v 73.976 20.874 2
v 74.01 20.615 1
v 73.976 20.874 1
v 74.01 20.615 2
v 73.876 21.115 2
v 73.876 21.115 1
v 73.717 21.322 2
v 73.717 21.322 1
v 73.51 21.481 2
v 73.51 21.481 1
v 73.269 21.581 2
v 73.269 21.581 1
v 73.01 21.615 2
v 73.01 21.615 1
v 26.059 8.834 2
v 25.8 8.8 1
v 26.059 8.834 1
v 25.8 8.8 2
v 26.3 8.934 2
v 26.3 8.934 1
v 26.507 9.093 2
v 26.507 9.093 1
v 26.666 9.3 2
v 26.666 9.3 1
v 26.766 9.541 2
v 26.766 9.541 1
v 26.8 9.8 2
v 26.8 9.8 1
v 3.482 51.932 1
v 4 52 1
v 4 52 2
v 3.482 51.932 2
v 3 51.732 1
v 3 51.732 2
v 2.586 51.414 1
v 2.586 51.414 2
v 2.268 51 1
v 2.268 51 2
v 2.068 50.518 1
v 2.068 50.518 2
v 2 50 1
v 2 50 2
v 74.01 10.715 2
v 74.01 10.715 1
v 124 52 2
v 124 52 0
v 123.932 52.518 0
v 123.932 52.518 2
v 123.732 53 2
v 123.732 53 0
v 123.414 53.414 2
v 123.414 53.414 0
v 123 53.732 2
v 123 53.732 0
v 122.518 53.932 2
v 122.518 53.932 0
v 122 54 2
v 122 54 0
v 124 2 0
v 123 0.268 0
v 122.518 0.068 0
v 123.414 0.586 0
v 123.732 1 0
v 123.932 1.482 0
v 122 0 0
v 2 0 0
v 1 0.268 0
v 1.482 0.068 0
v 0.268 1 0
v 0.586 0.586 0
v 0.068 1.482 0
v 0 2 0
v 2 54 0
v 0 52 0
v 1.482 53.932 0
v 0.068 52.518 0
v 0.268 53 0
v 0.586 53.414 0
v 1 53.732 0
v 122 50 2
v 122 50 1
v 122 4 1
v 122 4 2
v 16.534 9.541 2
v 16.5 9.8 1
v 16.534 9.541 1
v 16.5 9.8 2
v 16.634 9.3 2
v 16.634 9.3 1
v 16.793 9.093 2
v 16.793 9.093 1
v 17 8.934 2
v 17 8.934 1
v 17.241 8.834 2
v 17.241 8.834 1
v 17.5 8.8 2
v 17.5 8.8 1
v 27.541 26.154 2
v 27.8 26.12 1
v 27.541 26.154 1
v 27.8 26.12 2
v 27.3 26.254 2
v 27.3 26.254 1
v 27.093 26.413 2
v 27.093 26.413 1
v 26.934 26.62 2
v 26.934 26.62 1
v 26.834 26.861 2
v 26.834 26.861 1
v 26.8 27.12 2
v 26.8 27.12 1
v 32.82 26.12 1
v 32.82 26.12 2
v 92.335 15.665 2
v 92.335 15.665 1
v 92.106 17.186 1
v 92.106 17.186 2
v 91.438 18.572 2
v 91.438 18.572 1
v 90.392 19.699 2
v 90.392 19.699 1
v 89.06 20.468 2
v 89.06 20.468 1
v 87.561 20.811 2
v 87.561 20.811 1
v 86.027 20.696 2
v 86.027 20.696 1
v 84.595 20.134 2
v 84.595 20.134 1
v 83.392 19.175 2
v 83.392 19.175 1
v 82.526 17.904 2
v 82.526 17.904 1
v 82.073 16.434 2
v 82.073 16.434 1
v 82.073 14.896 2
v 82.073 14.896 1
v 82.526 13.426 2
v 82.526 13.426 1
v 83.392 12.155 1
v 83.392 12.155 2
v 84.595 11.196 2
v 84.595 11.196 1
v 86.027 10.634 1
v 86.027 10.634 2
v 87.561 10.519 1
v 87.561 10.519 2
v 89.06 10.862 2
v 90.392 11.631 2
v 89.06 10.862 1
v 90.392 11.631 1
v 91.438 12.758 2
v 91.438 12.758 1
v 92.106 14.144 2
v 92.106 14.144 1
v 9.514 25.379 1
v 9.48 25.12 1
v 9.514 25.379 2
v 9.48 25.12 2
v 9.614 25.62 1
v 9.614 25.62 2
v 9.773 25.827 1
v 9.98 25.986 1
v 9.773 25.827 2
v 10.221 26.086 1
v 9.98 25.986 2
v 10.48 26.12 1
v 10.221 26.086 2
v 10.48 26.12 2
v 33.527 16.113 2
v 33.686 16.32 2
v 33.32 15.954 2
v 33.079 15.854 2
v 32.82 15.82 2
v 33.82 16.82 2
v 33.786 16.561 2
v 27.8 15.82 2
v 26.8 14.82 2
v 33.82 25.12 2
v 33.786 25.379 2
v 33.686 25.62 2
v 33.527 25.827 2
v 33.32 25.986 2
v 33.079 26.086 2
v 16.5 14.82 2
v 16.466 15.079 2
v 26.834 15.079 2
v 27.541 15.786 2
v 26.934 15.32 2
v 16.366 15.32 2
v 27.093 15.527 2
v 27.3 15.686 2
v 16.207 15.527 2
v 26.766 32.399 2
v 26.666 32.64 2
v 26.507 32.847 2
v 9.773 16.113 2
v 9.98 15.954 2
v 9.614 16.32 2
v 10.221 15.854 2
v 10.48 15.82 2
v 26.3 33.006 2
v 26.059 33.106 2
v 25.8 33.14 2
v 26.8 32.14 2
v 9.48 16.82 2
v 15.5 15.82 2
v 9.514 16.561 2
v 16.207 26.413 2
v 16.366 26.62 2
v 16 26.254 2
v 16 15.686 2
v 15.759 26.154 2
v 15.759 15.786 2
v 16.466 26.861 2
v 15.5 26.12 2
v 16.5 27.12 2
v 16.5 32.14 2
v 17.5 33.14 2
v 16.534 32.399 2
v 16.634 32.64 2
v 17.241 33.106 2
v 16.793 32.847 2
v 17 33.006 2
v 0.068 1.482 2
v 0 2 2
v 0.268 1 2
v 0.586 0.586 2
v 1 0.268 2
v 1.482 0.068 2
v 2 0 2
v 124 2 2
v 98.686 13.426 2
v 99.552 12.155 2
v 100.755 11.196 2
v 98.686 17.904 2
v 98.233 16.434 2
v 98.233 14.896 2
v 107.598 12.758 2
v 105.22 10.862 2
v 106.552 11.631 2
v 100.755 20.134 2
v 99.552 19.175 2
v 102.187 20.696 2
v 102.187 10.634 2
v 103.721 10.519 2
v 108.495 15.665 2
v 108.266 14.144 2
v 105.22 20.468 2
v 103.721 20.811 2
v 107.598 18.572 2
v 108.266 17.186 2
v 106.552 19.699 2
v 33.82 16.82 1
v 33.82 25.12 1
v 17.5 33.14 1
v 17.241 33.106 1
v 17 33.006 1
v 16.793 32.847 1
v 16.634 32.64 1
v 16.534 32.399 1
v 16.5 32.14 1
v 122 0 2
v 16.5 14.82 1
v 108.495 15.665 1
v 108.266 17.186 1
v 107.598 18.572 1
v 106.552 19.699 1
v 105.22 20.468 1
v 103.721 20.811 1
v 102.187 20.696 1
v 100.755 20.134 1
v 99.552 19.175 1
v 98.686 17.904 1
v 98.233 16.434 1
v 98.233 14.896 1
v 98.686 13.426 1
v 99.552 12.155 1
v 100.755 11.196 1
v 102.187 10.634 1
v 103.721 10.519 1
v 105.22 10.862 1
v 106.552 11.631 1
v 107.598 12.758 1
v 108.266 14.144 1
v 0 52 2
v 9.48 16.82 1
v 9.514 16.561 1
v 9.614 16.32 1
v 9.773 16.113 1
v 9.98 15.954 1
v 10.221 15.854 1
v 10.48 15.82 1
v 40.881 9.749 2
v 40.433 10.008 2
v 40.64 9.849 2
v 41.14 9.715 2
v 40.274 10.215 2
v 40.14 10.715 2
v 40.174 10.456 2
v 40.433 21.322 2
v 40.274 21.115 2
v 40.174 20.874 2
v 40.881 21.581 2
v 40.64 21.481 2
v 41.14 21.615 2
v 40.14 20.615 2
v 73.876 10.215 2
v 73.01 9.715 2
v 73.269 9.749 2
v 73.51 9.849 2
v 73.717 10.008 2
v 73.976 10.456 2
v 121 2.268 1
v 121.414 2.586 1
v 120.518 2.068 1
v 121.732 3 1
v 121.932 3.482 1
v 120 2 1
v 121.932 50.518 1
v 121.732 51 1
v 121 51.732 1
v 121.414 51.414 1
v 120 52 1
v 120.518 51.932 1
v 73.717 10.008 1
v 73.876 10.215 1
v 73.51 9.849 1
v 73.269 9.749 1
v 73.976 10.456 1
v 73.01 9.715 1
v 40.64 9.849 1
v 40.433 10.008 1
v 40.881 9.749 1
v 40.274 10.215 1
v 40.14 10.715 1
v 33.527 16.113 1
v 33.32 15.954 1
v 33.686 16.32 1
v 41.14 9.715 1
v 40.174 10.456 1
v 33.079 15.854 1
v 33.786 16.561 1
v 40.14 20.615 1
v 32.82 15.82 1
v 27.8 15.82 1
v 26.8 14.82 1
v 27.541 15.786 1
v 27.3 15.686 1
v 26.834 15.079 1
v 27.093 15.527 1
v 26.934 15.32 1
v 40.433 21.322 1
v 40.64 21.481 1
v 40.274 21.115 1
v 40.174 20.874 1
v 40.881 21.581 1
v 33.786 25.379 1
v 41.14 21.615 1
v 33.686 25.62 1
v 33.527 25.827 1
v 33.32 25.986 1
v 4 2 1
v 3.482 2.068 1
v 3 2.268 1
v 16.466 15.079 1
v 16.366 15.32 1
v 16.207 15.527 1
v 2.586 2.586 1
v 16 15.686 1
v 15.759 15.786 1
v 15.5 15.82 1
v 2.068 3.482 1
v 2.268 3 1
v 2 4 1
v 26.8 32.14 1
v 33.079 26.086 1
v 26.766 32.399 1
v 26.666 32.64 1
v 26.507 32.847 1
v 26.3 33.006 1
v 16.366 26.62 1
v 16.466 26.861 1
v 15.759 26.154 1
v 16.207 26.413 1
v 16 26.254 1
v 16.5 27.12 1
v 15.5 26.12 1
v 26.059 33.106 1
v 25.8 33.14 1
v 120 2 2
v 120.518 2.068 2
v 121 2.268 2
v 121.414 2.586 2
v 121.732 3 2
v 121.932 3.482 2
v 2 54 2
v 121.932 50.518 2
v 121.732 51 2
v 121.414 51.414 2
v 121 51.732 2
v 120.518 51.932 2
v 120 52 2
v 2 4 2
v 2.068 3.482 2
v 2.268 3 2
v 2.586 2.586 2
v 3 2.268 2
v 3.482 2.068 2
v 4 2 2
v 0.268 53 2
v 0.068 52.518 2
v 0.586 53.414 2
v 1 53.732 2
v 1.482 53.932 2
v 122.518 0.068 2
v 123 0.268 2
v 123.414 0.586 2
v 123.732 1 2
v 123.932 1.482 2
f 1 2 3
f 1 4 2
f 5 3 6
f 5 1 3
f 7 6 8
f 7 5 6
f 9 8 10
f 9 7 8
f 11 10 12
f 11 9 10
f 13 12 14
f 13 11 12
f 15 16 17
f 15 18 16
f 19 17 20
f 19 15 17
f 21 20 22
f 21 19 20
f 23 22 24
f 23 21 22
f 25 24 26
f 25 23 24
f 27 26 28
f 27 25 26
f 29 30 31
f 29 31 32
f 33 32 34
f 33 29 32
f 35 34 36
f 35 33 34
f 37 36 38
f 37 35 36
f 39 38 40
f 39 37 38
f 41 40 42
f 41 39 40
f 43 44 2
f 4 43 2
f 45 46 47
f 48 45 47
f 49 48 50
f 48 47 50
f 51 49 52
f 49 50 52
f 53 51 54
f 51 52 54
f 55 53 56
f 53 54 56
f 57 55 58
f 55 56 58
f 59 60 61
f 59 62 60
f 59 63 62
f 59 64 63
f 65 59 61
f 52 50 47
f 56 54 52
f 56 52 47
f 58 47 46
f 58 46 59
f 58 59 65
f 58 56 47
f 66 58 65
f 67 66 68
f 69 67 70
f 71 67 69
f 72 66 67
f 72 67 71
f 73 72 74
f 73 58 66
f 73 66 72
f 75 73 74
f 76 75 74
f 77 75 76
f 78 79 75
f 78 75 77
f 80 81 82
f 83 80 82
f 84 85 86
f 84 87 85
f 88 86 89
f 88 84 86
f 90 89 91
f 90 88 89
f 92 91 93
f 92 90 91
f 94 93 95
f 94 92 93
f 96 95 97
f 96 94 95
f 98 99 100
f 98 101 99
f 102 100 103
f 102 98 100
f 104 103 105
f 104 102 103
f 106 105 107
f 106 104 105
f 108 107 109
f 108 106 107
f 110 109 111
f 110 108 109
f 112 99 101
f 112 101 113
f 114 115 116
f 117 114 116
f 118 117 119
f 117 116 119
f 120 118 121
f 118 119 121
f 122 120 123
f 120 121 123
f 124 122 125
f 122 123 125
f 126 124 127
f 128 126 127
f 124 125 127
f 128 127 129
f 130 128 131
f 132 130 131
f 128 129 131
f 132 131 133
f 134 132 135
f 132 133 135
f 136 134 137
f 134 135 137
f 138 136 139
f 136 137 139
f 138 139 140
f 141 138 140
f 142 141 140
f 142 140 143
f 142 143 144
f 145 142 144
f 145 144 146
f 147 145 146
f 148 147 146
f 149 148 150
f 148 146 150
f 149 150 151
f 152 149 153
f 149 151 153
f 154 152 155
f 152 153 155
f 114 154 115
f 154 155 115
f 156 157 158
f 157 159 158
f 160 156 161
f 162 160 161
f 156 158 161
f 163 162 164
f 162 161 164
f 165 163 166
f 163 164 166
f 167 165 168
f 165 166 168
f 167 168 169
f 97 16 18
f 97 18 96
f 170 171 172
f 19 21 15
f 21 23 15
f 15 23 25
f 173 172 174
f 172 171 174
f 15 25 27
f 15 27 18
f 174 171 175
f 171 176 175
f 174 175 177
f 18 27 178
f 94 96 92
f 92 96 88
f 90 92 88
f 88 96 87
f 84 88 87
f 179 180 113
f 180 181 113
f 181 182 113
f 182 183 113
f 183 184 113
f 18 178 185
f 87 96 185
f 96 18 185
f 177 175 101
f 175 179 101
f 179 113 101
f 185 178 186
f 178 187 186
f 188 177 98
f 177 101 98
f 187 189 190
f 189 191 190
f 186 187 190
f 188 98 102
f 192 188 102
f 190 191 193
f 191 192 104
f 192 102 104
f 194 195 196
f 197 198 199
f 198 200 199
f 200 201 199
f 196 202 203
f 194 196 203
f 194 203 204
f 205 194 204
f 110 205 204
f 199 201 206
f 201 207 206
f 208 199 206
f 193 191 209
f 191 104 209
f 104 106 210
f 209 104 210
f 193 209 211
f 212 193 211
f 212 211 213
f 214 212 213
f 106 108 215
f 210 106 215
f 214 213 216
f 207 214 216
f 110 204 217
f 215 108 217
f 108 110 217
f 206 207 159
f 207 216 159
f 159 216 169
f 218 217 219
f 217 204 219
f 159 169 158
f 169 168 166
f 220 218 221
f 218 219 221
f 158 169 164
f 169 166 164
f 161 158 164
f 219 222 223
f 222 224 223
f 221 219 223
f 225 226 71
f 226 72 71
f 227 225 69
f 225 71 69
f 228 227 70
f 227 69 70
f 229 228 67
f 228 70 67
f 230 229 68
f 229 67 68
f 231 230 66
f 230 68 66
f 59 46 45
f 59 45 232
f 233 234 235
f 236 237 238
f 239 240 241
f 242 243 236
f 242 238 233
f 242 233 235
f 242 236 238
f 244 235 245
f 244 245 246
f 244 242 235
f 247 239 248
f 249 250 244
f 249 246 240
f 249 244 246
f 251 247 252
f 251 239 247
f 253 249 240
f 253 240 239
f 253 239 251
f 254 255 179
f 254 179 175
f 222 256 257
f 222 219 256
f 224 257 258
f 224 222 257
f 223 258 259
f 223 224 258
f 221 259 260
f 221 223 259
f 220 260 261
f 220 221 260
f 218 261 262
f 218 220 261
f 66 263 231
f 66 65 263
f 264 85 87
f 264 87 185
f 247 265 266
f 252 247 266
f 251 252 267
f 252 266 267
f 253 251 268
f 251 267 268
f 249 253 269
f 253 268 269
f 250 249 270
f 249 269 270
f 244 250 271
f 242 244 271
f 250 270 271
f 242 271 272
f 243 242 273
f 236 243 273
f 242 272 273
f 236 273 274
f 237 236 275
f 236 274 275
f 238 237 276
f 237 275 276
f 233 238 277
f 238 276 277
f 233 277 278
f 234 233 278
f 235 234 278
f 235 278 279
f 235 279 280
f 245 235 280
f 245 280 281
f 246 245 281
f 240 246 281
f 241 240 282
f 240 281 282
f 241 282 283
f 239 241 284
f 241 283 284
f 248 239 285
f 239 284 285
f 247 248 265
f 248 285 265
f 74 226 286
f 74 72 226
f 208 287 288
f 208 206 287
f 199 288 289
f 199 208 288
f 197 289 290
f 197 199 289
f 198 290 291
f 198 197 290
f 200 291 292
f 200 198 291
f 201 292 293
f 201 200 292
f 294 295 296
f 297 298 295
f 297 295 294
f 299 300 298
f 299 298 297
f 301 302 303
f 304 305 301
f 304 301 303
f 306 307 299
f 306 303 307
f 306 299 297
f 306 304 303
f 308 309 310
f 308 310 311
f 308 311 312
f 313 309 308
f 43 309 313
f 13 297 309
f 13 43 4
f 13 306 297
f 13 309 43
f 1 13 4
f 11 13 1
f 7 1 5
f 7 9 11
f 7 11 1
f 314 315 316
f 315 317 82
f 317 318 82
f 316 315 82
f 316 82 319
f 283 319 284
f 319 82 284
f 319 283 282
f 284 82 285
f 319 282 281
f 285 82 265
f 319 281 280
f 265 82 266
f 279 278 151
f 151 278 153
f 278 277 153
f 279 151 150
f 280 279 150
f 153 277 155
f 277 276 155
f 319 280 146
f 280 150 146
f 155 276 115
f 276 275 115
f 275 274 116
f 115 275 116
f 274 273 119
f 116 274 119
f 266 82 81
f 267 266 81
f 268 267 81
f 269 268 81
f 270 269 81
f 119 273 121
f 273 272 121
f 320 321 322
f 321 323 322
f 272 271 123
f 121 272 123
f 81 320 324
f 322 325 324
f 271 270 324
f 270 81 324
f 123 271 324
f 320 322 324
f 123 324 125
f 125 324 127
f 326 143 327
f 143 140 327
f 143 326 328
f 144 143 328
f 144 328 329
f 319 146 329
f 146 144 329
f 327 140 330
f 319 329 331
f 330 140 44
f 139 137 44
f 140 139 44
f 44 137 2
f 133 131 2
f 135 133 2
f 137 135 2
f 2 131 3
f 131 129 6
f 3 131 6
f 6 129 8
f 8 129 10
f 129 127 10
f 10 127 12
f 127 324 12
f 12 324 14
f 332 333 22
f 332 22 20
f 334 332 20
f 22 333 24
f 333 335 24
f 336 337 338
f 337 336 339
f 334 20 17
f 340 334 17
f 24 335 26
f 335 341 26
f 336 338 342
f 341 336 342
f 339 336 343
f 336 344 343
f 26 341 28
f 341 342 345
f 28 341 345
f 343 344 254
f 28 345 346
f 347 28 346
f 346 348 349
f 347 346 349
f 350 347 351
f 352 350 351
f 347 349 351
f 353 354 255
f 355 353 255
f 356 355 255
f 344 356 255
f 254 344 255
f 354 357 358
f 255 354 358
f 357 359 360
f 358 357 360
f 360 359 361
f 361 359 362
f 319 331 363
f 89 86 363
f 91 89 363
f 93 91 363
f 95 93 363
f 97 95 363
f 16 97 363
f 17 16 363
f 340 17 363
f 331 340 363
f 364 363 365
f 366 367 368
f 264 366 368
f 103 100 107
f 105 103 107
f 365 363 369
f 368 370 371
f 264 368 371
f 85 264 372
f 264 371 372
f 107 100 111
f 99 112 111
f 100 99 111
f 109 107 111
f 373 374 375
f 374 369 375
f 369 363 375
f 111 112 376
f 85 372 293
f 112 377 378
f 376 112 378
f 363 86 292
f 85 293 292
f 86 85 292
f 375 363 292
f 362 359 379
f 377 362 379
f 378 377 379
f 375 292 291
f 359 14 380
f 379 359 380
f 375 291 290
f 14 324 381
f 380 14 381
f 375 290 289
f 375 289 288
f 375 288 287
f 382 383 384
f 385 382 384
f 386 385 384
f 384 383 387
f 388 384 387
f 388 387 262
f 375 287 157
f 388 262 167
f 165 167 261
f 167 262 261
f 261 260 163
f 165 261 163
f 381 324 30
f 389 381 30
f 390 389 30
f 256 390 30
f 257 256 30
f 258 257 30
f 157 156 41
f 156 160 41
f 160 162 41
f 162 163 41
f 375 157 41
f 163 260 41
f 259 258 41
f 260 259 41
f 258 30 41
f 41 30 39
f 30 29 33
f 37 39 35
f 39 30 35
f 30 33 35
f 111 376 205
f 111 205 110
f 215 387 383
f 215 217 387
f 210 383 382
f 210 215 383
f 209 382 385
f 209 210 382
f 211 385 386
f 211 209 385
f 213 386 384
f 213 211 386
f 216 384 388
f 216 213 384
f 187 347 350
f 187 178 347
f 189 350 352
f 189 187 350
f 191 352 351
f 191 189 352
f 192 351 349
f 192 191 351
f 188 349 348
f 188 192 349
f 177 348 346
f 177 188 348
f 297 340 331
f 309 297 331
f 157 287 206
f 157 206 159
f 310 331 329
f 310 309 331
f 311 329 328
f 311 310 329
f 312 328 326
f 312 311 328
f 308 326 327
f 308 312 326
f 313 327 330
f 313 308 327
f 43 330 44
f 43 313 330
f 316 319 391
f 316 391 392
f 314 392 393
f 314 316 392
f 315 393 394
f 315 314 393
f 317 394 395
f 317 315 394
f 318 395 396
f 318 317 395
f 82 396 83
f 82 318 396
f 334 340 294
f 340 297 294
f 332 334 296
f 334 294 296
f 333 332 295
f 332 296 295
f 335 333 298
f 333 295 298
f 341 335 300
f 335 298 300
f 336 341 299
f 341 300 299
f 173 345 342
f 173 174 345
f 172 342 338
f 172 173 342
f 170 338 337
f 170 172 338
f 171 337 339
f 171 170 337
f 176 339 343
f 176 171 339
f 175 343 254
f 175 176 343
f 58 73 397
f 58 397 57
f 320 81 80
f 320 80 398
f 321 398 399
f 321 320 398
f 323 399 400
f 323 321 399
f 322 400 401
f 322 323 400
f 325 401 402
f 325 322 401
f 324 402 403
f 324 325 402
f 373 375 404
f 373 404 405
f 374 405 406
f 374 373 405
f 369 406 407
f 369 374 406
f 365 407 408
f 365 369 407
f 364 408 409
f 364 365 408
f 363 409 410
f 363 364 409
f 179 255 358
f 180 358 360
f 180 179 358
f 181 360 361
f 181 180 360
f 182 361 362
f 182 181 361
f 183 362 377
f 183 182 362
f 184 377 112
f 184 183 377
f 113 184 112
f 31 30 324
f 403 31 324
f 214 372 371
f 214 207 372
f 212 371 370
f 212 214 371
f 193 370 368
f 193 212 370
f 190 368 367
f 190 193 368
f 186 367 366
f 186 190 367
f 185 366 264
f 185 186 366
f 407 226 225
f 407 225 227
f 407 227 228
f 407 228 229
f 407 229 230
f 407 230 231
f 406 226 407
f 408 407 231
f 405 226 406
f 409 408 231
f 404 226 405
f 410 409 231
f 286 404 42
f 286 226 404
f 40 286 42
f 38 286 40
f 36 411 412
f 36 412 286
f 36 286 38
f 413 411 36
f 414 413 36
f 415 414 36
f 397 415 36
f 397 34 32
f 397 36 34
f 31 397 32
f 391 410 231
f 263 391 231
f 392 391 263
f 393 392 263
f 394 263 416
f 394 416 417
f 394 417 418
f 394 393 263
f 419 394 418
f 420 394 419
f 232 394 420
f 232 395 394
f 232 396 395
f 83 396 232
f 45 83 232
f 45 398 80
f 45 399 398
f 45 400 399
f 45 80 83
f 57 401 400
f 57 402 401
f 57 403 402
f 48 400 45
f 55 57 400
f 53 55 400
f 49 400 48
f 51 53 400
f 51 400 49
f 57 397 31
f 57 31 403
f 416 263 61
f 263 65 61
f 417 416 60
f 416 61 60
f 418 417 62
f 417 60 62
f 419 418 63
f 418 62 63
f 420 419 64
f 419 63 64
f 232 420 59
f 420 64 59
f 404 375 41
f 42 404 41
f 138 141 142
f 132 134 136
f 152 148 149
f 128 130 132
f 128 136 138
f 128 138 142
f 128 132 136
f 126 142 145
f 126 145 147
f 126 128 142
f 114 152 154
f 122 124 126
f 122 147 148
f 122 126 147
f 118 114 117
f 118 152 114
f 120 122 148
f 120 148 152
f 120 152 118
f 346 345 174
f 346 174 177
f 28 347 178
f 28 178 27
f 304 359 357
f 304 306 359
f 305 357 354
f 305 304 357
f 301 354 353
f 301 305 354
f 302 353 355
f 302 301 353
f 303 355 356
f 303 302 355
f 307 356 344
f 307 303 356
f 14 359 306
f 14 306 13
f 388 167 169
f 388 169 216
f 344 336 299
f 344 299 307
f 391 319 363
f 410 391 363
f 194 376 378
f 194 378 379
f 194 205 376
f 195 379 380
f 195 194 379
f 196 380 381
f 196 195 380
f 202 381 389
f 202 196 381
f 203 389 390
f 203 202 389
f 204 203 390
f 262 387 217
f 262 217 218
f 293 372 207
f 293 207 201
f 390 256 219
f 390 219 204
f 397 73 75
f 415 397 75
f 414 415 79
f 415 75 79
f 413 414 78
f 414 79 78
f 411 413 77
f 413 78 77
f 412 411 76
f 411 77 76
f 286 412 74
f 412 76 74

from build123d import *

# Parameters (mm, degrees)
PAD_DEPTH    = 1
SKETCH001_R  = 5.16
SKETCH001_W  = 33.87
SKETCH001_H  = 11.9
PAD001_DEPTH = 1
FILLET_R     = 1


with BuildPart() as part:
    # Sketch → Pad (new body)
    with BuildSketch(Plane.XY):
        with BuildLine():
            Line((2, 54), (122, 54))
            ThreePointArc((124, 52), (123.414214, 53.414214), (122, 54))
            Line((124, 52), (124, 2))
            ThreePointArc((122, 0), (123.414214, 0.585786), (124, 2))
            Line((122, 0), (2, 0))
            ThreePointArc((0, 2), (0.585786, 0.585786), (2, 0))
            Line((0, 2), (0, 52))
            ThreePointArc((2, 54), (0.585786, 53.414214), (0, 52))
        make_face()
    extrude(amount=PAD_DEPTH)

    # Sketch001 (on Face10 of Pad) → Pad001 (join)
    with BuildSketch(Plane.XY.offset(1)):
        with BuildLine():
            ThreePointArc((2, 54), (0.585786, 53.414214), (0, 52))
            Line((0, 2), (0, 52))
            ThreePointArc((0, 2), (0.585786, 0.585786), (2, 0))
            Line((122, 0), (2, 0))
            ThreePointArc((122, 0), (123.414214, 0.585786), (124, 2))
            Line((124, 52), (124, 2))
            ThreePointArc((124, 52), (123.414214, 53.414214), (122, 54))
            Line((2, 54), (122, 54))
        make_face()
        with BuildLine():
            Line((4, 52), (120, 52))
            ThreePointArc((122, 50), (121.414214, 51.414214), (120, 52))
            Line((122, 50), (122, 4))
            ThreePointArc((120, 2), (121.414214, 2.585786), (122, 4))
            Line((120, 2), (4, 2))
            ThreePointArc((2, 4), (2.585786, 2.585786), (4, 2))
            Line((2, 4), (2, 50))
            ThreePointArc((4, 52), (2.585786, 51.414214), (2, 50))
        make_face(mode=Mode.SUBTRACT)
        with Locations((87.175, 15.665)):
            Circle(SKETCH001_R)
        with Locations((103.335, 15.665)):
            Circle(SKETCH001_R)
        Polygon((9.48, 26.12), (16.5, 26.12), (16.5, 33.14), (26.8, 33.14), (26.8, 26.12), (33.82, 26.12), (33.82, 15.82), (26.8, 15.82), (26.8, 8.8), (16.5, 8.8), (16.5, 15.82), (9.48, 15.82), align=None)
        with Locations((57.075, 15.665)):
            Rectangle(SKETCH001_W, SKETCH001_H)
    extrude(amount=PAD001_DEPTH)

    # Fillet
    fillet_edges = [part.edges().sort_by_distance(p)[0] for p in [
        (26.8, 15.82, 1.5),
        (33.82, 15.82, 1.5),
        (33.82, 26.12, 1.5),
        (26.8, 33.14, 1.5),
        (74.01, 9.715, 1.5),
        (74.01, 21.615, 1.5),
        (40.14, 9.715, 1.5),
        (26.8, 8.8, 1.5),
        (16.5, 8.8, 1.5),
        (9.48, 15.82, 1.5),
        (26.8, 26.12, 1.5),
        (40.14, 21.615, 1.5),
        (16.5, 33.14, 1.5),
        (9.48, 26.12, 1.5),
        (16.5, 26.12, 1.5),
        (16.5, 15.82, 1.5),
    ]]
    fillet(fillet_edges, radius=FILLET_R)


solid = part.part
